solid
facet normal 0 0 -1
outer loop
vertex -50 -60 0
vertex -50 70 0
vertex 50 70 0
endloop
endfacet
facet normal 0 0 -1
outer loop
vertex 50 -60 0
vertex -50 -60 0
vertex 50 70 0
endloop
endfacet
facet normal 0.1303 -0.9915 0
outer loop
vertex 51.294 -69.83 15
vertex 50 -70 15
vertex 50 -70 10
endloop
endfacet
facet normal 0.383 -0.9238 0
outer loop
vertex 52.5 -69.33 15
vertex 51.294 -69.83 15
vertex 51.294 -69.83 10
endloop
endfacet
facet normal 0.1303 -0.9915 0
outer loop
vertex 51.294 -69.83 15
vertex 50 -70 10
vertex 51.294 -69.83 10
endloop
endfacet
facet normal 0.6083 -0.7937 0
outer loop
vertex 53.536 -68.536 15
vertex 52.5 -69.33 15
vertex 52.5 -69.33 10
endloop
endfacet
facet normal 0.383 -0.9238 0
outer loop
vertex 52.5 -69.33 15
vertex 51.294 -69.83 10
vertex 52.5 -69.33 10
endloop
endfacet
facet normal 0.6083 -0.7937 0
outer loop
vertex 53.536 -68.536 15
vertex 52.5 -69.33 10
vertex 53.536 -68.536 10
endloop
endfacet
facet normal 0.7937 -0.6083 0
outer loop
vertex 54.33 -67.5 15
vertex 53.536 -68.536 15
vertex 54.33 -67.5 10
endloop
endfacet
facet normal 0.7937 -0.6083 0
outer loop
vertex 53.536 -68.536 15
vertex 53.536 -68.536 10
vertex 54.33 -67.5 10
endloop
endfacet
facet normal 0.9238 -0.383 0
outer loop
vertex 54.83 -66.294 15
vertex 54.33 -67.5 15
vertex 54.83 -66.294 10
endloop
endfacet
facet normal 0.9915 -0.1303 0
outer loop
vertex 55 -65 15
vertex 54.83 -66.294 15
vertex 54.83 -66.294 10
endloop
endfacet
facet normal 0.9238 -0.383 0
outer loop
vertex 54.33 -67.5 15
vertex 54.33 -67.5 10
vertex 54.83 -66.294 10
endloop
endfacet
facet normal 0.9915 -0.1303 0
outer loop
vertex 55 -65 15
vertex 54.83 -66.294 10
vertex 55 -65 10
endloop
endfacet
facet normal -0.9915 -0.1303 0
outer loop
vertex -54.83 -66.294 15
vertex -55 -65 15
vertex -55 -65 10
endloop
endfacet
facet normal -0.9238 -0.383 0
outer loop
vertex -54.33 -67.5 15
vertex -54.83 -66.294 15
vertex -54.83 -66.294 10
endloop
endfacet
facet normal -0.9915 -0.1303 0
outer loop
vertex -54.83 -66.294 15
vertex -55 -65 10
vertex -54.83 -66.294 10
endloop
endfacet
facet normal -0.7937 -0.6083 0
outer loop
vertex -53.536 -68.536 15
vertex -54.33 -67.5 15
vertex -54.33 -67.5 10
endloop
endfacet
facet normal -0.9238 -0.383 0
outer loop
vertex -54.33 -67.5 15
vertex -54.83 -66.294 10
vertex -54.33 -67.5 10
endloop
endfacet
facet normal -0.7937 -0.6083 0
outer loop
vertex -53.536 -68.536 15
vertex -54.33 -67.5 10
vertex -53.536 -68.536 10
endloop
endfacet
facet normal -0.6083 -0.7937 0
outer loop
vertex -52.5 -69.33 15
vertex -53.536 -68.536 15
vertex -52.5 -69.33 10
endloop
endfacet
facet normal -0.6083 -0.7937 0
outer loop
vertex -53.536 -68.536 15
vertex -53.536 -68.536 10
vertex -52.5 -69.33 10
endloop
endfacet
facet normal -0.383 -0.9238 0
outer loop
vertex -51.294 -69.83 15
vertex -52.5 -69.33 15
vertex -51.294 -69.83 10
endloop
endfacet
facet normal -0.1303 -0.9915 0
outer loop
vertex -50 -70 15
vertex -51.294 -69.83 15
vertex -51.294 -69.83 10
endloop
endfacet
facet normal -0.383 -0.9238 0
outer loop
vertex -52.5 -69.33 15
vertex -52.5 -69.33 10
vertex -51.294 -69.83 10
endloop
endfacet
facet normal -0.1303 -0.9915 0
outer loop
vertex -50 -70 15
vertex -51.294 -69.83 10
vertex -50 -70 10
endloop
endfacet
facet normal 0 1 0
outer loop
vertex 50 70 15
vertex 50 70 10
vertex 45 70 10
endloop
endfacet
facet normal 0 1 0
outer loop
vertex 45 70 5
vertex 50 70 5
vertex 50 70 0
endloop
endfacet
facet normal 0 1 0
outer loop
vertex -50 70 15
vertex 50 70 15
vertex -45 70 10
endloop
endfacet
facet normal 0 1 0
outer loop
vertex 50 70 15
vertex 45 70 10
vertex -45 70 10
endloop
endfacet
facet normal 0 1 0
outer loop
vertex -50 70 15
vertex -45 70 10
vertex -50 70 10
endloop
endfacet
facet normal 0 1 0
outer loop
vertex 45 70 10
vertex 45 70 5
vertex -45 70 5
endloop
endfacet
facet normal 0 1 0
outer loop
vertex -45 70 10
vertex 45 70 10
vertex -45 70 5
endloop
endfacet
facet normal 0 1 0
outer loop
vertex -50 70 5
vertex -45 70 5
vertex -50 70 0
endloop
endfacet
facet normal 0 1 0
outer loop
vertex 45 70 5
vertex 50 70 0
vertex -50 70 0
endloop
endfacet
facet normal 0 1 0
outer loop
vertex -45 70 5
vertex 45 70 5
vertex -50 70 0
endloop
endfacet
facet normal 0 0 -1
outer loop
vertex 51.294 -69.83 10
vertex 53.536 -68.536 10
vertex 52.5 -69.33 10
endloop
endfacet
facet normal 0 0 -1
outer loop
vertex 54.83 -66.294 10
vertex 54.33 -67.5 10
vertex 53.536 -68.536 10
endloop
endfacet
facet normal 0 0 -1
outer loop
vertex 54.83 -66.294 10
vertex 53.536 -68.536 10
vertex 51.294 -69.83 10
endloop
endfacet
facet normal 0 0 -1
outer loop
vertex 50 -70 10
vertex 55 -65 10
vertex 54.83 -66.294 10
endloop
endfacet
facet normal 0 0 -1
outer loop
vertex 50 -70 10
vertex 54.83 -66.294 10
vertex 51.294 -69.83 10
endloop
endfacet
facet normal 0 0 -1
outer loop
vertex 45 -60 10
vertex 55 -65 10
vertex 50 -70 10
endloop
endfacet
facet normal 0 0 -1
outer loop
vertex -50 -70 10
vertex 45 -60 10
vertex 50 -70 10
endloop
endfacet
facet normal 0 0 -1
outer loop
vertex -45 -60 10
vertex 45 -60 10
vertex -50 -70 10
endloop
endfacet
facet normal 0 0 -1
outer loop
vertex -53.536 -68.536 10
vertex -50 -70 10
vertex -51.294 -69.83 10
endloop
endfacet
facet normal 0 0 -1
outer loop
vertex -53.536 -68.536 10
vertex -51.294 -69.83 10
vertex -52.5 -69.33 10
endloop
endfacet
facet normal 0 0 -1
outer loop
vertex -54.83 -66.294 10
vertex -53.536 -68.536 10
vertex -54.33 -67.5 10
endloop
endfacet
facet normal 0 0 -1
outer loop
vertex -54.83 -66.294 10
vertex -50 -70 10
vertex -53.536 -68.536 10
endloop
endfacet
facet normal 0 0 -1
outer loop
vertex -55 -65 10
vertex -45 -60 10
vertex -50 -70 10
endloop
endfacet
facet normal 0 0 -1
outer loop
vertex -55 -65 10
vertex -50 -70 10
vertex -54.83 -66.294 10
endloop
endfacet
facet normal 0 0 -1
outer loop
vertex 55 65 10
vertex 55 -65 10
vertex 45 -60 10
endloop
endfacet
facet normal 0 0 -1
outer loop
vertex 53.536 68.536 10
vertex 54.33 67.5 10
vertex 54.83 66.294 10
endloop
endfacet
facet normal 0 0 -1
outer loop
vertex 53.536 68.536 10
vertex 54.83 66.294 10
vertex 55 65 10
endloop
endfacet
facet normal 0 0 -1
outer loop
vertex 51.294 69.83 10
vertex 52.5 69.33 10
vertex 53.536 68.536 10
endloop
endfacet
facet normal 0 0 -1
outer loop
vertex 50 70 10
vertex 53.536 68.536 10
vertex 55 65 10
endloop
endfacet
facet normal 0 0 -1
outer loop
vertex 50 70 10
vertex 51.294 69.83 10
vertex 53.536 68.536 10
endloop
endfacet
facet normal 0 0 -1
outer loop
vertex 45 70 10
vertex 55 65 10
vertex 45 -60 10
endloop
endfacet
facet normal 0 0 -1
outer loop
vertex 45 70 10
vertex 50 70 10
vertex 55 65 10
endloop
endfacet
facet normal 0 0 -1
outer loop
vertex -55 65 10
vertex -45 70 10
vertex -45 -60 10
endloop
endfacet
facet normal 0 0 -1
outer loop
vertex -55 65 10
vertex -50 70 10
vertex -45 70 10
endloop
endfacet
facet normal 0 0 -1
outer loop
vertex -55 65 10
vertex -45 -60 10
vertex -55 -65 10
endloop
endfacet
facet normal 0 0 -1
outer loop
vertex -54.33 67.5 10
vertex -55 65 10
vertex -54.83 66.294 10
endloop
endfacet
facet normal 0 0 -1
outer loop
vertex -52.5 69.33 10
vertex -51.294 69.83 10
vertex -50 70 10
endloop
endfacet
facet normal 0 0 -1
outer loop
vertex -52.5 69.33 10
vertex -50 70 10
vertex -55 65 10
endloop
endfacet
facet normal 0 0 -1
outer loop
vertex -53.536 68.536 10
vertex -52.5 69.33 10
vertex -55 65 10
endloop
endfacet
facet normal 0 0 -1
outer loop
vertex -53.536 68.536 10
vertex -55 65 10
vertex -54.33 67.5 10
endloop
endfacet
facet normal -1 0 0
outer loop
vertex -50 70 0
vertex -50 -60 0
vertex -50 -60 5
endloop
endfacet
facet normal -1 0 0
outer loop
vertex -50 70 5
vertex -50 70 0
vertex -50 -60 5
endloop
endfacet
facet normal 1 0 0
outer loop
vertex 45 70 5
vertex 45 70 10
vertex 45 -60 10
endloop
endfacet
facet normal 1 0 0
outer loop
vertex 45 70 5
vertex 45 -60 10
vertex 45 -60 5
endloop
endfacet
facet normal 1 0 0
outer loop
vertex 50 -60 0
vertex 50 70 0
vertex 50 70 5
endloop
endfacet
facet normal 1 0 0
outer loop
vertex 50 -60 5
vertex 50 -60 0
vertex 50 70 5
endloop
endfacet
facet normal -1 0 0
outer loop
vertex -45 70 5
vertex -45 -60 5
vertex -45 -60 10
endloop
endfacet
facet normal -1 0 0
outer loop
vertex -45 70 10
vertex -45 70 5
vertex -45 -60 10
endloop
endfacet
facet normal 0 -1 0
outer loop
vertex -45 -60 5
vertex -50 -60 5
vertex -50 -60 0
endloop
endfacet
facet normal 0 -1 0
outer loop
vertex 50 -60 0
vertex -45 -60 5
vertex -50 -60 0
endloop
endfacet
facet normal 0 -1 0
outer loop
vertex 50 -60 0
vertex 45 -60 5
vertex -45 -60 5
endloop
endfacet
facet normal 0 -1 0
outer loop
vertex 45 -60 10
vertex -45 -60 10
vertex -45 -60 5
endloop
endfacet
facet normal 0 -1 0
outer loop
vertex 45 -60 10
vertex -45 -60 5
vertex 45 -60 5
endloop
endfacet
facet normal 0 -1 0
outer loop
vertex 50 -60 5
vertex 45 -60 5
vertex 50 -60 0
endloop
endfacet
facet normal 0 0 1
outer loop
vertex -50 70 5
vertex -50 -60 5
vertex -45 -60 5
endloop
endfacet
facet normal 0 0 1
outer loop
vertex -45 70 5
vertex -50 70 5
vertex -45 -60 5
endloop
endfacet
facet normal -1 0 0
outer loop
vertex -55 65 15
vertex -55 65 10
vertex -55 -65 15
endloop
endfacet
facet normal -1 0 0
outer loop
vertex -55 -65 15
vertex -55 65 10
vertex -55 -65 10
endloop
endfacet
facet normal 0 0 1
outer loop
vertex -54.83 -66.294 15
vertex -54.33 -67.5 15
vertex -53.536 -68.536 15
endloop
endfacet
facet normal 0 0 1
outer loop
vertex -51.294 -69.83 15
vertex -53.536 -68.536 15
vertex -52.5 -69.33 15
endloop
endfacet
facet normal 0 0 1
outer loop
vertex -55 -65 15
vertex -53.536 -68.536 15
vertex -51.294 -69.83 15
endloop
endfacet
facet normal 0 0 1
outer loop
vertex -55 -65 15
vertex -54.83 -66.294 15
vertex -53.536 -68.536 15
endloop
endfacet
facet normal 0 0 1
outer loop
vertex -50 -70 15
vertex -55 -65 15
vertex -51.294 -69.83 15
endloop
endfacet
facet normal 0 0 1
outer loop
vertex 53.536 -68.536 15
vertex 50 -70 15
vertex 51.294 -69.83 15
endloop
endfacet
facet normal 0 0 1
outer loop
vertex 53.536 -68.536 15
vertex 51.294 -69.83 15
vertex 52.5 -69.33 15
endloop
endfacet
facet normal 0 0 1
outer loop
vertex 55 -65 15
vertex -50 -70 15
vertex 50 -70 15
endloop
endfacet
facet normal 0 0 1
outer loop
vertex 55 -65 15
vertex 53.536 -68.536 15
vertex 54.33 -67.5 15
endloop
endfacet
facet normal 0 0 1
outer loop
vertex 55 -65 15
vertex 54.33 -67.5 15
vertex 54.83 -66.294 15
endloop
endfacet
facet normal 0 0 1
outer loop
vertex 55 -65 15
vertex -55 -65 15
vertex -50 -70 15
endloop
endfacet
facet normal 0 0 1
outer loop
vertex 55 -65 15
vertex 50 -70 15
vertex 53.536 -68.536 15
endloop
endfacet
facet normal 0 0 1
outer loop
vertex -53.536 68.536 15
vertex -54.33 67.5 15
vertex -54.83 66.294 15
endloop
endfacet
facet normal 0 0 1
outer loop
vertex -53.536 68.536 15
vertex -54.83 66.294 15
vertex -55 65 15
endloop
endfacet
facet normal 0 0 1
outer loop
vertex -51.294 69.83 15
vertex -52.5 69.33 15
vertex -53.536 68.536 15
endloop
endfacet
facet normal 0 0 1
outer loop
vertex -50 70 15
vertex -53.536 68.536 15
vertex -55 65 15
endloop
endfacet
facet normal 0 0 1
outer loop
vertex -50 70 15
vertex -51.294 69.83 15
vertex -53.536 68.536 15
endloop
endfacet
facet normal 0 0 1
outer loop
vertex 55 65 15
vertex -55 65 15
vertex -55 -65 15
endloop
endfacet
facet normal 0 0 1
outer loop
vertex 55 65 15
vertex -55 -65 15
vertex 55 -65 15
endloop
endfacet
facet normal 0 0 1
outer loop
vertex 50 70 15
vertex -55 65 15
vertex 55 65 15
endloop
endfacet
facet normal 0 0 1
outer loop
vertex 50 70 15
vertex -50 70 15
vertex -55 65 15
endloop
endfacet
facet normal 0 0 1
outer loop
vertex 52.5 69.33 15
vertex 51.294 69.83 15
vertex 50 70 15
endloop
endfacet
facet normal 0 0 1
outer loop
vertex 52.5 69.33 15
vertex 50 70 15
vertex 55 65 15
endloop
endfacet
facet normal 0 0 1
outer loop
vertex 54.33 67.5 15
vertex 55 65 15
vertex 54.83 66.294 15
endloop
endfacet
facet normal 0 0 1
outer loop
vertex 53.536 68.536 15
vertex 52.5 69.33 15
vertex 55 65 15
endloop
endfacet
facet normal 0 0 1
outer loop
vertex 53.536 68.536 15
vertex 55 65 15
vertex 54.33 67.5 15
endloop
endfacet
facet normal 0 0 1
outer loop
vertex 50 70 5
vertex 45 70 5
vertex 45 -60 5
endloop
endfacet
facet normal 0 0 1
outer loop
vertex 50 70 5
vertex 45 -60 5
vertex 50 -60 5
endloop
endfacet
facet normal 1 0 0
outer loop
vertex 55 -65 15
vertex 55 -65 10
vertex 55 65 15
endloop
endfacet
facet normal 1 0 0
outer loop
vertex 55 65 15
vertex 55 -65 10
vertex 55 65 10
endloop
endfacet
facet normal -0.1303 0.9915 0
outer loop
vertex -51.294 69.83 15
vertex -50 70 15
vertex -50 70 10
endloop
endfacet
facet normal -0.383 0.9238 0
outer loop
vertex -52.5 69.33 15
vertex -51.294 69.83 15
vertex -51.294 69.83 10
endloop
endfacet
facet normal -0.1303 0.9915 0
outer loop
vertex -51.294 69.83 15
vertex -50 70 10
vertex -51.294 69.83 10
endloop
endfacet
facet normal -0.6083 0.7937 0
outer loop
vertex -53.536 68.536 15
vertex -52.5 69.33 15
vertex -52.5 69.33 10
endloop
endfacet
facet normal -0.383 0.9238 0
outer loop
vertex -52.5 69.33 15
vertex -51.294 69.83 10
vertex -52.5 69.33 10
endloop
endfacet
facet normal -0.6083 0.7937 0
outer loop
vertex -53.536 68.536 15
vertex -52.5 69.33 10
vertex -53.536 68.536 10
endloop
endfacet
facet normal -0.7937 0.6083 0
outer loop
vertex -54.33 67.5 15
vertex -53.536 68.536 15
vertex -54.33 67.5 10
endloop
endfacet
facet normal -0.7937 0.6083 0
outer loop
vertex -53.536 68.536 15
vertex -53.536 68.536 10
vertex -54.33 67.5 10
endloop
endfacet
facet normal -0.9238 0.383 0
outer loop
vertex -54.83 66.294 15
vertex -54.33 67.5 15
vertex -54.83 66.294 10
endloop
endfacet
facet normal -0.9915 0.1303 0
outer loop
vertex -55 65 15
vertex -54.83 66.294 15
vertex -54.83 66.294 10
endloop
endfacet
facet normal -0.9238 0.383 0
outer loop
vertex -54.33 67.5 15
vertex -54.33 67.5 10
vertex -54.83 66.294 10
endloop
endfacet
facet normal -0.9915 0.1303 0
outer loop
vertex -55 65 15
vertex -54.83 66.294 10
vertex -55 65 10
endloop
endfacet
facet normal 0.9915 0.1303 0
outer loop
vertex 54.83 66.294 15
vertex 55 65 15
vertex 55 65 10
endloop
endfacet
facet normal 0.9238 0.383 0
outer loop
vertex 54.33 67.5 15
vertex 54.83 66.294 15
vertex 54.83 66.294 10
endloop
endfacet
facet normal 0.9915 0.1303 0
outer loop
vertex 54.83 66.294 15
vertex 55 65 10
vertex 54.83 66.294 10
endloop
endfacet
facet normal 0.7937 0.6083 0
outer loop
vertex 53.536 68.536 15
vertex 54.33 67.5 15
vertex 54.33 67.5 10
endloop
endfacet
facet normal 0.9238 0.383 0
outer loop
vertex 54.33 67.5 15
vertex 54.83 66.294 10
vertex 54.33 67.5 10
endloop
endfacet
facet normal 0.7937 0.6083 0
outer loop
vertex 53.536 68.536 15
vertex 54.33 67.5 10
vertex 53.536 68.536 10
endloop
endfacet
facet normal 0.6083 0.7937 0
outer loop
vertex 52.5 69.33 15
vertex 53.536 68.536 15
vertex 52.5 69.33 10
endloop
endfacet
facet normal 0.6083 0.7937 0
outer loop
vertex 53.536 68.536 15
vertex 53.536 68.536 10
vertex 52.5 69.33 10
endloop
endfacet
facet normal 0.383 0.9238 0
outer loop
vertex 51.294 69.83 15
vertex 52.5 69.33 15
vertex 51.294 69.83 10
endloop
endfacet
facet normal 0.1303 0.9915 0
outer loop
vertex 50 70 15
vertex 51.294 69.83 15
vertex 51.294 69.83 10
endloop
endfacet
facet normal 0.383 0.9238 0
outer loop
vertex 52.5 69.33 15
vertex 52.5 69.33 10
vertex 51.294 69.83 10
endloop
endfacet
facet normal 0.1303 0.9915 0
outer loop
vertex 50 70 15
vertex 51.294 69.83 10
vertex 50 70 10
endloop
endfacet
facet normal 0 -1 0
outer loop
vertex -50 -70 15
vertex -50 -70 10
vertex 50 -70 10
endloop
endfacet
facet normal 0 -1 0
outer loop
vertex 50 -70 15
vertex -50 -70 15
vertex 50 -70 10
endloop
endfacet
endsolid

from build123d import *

# Parameters (mm, degrees)
F1_DEPTH = 15
F2_W     = 5
F2_H     = 5
F3_DEPTH = 70
F5_DEPTH = 10


with BuildPart() as f1:
    # F0 (on Top) → F1 (new body)
    with BuildSketch(Plane.XY):
        with BuildLine():
            ThreePointArc((55, 65), (53.535534, 68.535534), (50, 70))
            Line((50, 70), (-50, 70))
            ThreePointArc((-50, 70), (-53.535534, 68.535534), (-55, 65))
            Line((-55, 65), (-55, -65))
            ThreePointArc((-55, -65), (-53.535534, -68.535534), (-50, -70))
            Line((-50, -70), (50, -70))
            ThreePointArc((50, -70), (53.535534, -68.535534), (55, -65))
            Line((55, -65), (55, 65))
        make_face()
    extrude(amount=F1_DEPTH)

    # F2 (on Front) → F3 (cut, symmetric)
    with BuildSketch(Plane.XZ):
        Polygon((-50, 5), (-45, 5), (-45, 10), (-55, 10), (-55, 5), align=None)
        with Locations((-52.5, 2.5)):
            Rectangle(F2_W, F2_H)
        with Locations((52.5, 2.5)):
            Rectangle(F2_W, F2_H)
        Polygon((50, 5), (55, 5), (55, 10), (45, 10), (45, 5), align=None)
    extrude(amount=F3_DEPTH, both=True, mode=Mode.SUBTRACT)

    # F4 (on face) → F5 (cut)
    with BuildSketch(Plane.XZ.offset(70)):
        Polygon((-50, 0), (50, 0), (50, 5), (45, 5), (45, 10), (-45, 10), (-45, 5), (-50, 5), align=None)
    extrude(amount=-F5_DEPTH, mode=Mode.SUBTRACT)


solid = f1.part
